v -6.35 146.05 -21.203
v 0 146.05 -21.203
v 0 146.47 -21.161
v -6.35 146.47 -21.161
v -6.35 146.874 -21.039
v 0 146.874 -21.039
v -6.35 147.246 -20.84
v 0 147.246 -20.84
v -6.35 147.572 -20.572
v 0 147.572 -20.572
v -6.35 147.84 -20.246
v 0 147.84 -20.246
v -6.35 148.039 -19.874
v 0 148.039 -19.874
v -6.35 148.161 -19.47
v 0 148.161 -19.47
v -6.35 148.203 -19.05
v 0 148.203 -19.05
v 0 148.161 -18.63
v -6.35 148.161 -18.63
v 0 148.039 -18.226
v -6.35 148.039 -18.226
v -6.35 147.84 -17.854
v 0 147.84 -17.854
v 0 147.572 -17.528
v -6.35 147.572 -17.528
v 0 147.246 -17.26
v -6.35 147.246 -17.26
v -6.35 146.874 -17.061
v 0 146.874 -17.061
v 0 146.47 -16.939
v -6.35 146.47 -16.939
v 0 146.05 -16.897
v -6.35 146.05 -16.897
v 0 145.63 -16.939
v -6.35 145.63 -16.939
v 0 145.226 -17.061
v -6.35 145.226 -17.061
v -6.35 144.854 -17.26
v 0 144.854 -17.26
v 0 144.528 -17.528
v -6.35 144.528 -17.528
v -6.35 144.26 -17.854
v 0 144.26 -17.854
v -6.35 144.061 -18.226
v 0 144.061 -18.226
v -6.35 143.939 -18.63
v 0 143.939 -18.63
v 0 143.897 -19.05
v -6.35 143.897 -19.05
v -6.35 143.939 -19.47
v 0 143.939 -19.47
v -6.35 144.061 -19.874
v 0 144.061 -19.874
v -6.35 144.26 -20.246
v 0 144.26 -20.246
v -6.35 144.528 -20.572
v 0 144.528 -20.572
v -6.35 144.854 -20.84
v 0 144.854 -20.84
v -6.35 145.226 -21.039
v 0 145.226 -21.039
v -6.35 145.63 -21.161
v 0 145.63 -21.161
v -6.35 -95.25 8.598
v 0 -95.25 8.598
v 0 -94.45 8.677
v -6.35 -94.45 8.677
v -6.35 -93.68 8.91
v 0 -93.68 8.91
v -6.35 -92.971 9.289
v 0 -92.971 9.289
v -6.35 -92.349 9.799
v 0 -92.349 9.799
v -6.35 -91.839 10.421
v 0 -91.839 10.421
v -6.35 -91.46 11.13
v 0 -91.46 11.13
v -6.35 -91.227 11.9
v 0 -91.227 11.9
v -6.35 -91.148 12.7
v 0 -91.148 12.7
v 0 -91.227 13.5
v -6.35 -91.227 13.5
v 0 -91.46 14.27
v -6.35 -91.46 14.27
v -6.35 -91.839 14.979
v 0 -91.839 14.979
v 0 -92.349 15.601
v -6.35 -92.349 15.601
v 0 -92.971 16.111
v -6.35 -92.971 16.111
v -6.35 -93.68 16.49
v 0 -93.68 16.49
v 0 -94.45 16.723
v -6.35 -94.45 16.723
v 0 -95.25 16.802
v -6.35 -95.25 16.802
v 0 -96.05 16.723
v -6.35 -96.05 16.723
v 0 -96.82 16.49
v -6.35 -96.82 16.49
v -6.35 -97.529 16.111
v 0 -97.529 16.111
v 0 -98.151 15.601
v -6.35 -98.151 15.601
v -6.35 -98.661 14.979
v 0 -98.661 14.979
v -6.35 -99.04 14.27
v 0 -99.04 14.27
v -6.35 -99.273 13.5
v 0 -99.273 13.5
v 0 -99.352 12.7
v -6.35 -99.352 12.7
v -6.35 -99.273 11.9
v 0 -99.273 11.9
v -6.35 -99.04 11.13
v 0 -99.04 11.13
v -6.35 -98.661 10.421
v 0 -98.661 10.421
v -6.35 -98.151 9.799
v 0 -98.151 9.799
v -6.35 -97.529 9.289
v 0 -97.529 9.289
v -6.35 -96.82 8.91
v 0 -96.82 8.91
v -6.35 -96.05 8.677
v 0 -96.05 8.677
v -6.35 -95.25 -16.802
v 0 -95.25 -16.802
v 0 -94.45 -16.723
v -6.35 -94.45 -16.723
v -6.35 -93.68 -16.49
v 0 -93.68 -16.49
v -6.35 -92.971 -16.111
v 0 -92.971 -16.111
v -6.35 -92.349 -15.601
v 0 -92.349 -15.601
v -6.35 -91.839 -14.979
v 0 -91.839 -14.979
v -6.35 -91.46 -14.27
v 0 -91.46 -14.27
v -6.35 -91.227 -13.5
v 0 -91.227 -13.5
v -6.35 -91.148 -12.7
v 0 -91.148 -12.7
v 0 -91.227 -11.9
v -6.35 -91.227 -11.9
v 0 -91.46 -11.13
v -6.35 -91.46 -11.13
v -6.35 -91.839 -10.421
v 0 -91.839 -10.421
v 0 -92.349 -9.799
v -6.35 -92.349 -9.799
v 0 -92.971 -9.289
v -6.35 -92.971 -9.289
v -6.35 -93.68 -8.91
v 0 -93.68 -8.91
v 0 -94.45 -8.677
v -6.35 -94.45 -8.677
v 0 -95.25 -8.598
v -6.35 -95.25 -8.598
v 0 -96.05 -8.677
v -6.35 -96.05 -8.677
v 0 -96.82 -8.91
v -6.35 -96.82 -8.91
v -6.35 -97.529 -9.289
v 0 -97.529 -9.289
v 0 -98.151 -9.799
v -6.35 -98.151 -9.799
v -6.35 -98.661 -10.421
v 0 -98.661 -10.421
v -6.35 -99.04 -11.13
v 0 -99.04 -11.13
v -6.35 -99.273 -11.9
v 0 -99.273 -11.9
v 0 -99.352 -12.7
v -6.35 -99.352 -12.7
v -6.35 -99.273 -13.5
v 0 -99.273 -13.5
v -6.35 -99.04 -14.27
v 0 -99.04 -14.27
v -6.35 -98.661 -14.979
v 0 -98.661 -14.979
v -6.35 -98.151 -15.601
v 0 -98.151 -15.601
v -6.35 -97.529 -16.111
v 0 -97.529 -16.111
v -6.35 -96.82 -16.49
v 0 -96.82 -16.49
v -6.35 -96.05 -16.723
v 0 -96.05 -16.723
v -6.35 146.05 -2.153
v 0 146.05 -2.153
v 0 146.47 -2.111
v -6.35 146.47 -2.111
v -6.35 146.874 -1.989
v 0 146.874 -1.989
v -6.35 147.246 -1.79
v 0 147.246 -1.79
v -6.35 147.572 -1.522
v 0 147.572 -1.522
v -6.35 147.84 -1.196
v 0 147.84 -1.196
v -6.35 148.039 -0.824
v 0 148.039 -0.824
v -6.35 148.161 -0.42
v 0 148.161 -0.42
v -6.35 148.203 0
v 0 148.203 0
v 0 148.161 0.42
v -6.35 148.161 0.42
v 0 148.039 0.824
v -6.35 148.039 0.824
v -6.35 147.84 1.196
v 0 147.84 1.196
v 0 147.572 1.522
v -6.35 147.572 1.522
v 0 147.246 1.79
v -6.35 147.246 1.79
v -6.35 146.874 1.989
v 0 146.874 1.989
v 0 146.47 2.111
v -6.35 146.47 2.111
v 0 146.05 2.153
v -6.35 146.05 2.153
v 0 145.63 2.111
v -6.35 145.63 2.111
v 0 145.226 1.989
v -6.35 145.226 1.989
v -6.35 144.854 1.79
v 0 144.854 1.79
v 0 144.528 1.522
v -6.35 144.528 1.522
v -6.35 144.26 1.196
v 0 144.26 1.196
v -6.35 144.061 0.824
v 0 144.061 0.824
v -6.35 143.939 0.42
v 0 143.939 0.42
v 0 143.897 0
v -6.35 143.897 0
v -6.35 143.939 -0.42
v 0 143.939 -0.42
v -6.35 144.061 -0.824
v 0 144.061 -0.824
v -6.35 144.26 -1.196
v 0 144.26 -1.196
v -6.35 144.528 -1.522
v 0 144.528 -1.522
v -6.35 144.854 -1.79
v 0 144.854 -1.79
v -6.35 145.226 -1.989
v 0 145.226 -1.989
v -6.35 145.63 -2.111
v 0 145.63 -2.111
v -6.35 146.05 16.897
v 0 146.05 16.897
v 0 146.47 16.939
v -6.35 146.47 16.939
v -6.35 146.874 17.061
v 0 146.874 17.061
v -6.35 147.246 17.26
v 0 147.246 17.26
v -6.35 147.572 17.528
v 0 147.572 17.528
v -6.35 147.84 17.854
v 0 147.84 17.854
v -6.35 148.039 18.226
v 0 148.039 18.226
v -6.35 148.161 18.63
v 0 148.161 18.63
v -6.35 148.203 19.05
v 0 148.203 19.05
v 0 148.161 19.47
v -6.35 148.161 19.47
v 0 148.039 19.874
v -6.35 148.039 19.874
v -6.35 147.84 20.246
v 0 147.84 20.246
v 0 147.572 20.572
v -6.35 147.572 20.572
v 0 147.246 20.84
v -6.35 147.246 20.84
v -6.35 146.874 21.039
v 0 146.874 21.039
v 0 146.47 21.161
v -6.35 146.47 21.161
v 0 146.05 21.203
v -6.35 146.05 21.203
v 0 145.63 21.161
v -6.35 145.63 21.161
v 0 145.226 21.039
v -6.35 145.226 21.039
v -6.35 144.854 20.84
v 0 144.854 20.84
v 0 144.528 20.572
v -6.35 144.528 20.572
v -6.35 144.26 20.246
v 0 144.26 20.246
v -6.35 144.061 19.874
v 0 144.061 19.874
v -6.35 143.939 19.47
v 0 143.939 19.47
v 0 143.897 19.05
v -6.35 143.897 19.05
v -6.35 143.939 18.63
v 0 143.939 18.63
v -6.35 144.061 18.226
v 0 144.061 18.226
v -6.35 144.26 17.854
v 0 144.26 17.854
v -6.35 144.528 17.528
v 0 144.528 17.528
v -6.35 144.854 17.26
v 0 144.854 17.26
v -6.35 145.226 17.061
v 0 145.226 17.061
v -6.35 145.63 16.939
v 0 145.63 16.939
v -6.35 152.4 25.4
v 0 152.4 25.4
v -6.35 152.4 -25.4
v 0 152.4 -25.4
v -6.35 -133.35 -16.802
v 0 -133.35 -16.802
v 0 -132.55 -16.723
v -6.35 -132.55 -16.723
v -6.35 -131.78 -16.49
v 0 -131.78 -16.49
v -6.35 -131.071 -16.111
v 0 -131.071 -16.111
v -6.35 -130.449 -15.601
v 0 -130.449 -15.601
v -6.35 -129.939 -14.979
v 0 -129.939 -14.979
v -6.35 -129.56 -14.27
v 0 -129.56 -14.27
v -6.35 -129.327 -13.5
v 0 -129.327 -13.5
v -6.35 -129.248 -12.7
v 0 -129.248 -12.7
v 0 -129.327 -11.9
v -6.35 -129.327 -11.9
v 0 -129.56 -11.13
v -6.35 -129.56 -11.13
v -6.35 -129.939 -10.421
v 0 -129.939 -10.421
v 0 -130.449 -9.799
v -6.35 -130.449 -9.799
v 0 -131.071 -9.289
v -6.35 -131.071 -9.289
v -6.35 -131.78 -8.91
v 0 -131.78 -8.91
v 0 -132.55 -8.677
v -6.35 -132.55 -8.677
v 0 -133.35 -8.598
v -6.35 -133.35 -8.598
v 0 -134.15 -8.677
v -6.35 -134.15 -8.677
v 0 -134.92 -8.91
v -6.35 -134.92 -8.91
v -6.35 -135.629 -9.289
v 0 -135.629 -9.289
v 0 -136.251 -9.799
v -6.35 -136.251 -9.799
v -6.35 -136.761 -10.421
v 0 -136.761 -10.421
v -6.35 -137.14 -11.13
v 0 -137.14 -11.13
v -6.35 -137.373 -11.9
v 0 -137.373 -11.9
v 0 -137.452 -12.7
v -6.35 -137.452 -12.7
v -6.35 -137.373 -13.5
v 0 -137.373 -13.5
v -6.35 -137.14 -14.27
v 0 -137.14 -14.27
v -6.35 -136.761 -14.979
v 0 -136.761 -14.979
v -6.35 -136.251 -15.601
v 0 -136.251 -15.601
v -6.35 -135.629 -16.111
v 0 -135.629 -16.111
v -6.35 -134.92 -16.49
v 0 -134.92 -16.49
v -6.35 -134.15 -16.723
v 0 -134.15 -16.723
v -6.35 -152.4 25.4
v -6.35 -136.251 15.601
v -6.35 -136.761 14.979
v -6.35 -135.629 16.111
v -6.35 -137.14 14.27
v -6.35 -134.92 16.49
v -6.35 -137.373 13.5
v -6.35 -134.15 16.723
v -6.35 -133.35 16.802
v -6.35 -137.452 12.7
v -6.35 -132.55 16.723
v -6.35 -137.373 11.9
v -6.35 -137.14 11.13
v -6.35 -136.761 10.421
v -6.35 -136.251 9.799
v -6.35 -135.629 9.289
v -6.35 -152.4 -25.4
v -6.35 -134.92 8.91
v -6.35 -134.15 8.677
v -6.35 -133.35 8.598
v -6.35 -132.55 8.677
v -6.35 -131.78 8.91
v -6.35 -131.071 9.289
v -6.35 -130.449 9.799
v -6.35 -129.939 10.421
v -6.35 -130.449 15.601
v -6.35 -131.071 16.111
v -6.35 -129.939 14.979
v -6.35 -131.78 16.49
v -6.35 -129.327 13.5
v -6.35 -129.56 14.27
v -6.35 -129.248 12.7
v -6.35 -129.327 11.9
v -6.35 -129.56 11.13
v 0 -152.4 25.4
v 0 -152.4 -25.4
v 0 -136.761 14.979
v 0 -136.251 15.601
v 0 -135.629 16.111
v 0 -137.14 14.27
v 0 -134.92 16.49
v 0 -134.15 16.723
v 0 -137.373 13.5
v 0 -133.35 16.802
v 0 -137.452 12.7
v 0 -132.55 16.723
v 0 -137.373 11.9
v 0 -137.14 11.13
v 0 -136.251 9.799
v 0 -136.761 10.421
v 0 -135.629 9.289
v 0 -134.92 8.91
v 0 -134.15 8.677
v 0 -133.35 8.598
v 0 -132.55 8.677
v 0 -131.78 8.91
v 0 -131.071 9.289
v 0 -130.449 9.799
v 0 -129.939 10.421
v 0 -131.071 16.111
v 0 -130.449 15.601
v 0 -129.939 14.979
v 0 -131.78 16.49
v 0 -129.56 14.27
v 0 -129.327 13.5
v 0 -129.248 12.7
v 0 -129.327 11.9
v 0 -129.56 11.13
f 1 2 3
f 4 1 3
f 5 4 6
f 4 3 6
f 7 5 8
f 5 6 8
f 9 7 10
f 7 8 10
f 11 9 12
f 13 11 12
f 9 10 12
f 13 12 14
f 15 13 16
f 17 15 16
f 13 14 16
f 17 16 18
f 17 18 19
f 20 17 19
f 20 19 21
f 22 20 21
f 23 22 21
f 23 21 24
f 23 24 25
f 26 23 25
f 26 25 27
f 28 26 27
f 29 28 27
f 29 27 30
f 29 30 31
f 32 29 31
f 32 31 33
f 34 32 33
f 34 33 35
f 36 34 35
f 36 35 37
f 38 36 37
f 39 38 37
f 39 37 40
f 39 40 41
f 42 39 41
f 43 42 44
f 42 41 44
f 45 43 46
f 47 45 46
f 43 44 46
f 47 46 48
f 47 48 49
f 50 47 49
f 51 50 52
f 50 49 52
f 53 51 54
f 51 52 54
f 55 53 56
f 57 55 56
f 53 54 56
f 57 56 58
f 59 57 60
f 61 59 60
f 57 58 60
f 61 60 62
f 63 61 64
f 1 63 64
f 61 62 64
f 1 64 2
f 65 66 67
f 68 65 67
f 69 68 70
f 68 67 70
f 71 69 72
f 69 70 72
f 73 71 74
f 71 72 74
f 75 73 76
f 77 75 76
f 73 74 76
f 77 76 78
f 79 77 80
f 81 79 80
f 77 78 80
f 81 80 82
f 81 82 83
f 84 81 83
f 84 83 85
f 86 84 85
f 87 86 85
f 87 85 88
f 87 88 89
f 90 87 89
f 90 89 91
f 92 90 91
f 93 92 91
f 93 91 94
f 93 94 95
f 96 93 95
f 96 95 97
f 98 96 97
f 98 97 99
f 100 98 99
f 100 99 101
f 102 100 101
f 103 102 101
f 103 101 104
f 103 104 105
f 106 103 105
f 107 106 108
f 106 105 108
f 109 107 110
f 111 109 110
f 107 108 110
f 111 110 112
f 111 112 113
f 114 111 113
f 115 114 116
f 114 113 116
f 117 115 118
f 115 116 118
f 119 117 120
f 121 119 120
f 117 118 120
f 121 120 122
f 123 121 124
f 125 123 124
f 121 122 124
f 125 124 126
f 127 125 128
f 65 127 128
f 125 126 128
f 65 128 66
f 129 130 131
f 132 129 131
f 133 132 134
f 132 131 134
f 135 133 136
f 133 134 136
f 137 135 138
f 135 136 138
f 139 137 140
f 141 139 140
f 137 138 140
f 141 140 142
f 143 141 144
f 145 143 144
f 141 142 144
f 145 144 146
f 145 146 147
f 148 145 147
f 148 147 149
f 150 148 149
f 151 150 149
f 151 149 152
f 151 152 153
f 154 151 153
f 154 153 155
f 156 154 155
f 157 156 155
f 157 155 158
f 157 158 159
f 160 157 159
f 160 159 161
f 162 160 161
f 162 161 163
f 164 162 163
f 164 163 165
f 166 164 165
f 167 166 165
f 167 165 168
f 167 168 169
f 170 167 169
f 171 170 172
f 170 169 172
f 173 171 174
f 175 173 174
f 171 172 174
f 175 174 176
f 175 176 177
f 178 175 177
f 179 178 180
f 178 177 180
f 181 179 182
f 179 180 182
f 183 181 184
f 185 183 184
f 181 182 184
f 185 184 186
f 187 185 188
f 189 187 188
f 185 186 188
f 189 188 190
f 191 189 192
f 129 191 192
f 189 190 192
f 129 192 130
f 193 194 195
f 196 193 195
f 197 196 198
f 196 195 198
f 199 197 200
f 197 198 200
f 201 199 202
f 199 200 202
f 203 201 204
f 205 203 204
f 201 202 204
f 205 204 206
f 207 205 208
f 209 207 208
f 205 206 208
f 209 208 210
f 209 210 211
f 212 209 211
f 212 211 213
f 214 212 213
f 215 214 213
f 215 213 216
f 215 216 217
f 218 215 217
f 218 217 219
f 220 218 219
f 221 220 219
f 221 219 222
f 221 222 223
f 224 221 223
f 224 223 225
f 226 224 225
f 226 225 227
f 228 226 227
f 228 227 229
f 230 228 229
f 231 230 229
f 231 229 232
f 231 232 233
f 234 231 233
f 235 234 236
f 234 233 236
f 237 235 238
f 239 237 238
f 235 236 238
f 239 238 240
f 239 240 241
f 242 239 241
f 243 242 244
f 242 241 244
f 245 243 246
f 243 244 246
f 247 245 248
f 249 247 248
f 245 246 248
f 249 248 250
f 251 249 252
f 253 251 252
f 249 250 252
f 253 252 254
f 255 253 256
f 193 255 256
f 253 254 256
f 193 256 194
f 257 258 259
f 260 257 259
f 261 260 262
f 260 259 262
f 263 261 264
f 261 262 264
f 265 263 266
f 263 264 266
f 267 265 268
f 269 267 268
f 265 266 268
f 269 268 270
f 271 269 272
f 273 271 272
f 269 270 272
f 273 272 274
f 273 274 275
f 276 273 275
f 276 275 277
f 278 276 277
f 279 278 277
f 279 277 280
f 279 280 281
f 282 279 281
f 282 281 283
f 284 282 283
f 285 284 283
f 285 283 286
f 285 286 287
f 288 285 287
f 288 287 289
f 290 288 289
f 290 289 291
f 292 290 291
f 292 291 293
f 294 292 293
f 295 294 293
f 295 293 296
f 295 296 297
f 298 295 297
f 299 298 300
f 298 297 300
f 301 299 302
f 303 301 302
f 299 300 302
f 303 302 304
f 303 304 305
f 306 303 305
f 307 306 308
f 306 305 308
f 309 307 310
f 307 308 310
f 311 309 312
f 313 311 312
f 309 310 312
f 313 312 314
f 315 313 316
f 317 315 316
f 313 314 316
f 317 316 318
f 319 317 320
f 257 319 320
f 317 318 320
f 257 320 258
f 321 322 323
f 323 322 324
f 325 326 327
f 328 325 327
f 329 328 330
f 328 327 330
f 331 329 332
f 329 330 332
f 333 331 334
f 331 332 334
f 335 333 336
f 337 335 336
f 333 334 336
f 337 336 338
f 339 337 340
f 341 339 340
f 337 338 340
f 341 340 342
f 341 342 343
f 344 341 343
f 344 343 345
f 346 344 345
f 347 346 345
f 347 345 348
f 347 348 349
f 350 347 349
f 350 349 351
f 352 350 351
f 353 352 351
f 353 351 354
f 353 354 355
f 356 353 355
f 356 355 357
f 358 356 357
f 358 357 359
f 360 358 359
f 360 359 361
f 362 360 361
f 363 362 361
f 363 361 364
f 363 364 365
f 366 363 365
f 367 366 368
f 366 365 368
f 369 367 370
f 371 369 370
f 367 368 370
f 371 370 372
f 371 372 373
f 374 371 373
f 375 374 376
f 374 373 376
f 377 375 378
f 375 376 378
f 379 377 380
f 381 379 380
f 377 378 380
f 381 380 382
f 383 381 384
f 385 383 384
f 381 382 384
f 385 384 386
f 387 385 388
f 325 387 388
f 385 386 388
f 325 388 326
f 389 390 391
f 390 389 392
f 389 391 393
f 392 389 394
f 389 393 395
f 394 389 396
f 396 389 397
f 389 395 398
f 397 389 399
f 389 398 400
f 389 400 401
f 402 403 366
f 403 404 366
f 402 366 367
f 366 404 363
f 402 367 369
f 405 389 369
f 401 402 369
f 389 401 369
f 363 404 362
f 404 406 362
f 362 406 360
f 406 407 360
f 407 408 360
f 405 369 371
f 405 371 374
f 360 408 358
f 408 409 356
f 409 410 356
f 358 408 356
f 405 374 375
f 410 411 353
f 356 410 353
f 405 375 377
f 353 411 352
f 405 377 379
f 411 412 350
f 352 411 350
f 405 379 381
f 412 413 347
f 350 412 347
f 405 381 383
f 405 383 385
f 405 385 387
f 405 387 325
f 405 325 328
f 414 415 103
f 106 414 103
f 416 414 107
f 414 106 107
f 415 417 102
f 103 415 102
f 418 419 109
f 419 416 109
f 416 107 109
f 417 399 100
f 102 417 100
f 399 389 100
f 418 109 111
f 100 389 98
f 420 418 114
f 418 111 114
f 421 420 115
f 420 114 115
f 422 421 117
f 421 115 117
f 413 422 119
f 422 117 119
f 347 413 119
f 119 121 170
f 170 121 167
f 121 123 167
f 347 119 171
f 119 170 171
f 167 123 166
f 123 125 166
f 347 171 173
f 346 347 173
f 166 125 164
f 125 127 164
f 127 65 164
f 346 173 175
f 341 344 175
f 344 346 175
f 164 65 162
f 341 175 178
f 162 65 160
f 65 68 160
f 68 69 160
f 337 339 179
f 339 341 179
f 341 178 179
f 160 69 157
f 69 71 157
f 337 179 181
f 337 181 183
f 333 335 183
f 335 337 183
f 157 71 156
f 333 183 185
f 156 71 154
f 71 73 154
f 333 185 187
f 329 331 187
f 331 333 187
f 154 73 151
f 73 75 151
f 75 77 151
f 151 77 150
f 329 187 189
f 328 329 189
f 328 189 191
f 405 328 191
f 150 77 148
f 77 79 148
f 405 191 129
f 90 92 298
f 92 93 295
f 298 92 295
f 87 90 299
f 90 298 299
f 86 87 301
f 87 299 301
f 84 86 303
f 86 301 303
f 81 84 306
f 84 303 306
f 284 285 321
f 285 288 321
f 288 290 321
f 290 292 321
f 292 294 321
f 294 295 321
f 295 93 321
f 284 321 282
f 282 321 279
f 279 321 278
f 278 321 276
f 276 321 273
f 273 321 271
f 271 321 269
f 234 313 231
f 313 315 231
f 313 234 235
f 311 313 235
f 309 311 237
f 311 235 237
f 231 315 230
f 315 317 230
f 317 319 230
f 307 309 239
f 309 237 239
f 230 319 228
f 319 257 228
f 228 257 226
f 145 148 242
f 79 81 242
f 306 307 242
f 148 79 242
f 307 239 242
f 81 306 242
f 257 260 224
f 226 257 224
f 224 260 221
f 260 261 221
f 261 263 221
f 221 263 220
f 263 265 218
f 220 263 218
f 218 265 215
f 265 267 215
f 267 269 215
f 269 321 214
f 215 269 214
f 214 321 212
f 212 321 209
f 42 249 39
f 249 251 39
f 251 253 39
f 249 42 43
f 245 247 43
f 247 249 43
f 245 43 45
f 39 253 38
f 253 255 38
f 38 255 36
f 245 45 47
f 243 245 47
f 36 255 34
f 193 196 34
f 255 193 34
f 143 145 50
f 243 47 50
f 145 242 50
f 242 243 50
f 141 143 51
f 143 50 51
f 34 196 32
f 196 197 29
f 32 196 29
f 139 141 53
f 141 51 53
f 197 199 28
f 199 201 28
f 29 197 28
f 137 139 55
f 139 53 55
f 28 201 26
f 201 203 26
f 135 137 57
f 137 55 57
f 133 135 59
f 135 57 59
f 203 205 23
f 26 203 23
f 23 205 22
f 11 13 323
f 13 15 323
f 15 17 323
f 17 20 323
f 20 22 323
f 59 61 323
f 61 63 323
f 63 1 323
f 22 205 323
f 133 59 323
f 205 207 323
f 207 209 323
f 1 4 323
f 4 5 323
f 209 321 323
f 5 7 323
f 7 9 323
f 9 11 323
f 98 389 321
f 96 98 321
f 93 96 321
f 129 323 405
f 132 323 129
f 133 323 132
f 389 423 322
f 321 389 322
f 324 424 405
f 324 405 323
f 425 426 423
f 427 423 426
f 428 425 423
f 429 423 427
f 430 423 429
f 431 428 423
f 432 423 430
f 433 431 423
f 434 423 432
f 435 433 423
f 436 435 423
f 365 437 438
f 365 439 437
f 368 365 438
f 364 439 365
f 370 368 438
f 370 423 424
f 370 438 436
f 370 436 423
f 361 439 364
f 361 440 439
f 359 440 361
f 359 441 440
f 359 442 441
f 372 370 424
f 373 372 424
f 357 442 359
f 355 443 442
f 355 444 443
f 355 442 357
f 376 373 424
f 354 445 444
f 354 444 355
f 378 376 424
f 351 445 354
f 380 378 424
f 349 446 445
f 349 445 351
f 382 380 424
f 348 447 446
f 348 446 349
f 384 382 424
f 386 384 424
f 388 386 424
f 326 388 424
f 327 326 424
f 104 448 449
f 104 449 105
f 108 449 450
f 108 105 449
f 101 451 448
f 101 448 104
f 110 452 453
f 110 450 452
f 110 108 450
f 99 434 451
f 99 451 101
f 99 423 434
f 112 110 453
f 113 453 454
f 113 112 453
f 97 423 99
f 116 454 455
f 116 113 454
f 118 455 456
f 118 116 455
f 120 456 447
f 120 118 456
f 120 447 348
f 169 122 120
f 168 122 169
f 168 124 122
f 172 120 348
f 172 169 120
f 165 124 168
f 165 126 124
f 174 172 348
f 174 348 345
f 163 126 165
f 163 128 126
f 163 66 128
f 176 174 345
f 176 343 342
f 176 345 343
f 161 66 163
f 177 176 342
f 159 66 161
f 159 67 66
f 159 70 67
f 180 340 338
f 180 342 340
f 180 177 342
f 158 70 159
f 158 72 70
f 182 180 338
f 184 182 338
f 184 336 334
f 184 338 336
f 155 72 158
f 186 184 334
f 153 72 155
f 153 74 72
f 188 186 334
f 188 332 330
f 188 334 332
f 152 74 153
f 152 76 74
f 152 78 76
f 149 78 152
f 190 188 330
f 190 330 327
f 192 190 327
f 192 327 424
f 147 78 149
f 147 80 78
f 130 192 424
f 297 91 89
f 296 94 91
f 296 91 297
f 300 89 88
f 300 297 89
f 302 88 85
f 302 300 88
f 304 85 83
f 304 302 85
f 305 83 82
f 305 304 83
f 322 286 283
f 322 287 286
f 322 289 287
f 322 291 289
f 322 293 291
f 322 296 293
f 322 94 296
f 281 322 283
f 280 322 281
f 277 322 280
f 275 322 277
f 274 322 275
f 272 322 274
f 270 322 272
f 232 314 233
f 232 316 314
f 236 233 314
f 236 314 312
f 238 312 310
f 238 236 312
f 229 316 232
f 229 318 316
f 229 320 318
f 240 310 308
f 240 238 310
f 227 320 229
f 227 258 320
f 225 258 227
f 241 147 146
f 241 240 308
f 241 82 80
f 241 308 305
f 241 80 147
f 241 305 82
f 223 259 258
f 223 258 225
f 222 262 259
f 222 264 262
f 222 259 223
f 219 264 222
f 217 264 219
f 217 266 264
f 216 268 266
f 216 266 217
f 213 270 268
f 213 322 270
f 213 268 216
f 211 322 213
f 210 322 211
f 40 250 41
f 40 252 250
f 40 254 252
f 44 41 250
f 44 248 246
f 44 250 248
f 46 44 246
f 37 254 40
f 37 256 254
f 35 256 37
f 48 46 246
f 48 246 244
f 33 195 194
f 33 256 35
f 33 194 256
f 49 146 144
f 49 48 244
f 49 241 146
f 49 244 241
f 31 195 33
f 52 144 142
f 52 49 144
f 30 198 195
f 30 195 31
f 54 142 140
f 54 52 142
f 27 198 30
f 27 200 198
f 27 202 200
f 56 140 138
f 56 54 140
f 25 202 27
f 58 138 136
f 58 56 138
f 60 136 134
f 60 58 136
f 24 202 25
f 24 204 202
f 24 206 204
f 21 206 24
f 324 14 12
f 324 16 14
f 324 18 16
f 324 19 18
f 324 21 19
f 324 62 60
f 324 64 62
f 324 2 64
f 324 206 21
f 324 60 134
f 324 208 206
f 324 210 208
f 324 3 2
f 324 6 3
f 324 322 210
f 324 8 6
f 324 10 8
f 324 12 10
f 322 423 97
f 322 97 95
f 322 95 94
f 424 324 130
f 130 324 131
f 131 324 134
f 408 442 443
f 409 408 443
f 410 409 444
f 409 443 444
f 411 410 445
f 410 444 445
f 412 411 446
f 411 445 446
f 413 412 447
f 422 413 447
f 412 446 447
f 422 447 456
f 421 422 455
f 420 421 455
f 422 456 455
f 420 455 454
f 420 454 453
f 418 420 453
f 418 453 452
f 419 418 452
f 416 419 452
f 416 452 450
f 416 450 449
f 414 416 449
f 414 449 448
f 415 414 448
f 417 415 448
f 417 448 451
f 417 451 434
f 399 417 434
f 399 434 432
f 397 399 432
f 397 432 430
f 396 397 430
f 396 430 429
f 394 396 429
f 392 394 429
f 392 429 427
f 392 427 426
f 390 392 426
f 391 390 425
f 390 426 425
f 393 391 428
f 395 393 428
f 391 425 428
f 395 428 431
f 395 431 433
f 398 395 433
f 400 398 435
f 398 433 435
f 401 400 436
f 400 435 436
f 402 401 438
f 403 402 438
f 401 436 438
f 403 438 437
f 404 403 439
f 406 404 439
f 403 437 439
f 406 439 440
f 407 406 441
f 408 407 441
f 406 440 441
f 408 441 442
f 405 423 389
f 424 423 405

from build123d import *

# Parameters (mm, degrees)
SKETCH1_W           = 50.8
SKETCH1_H           = 304.8
BOSS_EXTRUDE1_DEPTH = 6.35
SKETCH2_R           = 4.1021
SKETCH2_R_2         = 2.15265
CUT_EXTRUDE1_DEPTH  = 155.632604906


with BuildPart() as part:
    # Sketch1 → Boss-Extrude1 (new body)
    with BuildSketch(Plane(origin=(0, 0, 0), x_dir=(0, 0, -1), z_dir=(1, 0, 0))):
        Rectangle(SKETCH1_W, SKETCH1_H)
    extrude(amount=-BOSS_EXTRUDE1_DEPTH)

    # Sketch2 → Cut-Extrude1 (cut, through all)
    with BuildSketch(Plane(origin=(0, 0, 0), x_dir=(0, 0, -1), z_dir=(1, 0, 0))):
        with Locations((-12.7, -95.25)):
            Circle(SKETCH2_R)
        with Locations((12.7, -95.25)):
            Circle(SKETCH2_R)
        with Locations((12.7, -133.35)):
            Circle(SKETCH2_R)
        with Locations((-12.7, -133.35)):
            Circle(SKETCH2_R)
        with Locations((-19.05, 146.05)):
            Circle(SKETCH2_R_2)
        with Locations((0, 146.05)):
            Circle(SKETCH2_R_2)
        with Locations((19.05, 146.05)):
            Circle(SKETCH2_R_2)
    extrude(amount=-CUT_EXTRUDE1_DEPTH, mode=Mode.SUBTRACT)


solid = part.part
